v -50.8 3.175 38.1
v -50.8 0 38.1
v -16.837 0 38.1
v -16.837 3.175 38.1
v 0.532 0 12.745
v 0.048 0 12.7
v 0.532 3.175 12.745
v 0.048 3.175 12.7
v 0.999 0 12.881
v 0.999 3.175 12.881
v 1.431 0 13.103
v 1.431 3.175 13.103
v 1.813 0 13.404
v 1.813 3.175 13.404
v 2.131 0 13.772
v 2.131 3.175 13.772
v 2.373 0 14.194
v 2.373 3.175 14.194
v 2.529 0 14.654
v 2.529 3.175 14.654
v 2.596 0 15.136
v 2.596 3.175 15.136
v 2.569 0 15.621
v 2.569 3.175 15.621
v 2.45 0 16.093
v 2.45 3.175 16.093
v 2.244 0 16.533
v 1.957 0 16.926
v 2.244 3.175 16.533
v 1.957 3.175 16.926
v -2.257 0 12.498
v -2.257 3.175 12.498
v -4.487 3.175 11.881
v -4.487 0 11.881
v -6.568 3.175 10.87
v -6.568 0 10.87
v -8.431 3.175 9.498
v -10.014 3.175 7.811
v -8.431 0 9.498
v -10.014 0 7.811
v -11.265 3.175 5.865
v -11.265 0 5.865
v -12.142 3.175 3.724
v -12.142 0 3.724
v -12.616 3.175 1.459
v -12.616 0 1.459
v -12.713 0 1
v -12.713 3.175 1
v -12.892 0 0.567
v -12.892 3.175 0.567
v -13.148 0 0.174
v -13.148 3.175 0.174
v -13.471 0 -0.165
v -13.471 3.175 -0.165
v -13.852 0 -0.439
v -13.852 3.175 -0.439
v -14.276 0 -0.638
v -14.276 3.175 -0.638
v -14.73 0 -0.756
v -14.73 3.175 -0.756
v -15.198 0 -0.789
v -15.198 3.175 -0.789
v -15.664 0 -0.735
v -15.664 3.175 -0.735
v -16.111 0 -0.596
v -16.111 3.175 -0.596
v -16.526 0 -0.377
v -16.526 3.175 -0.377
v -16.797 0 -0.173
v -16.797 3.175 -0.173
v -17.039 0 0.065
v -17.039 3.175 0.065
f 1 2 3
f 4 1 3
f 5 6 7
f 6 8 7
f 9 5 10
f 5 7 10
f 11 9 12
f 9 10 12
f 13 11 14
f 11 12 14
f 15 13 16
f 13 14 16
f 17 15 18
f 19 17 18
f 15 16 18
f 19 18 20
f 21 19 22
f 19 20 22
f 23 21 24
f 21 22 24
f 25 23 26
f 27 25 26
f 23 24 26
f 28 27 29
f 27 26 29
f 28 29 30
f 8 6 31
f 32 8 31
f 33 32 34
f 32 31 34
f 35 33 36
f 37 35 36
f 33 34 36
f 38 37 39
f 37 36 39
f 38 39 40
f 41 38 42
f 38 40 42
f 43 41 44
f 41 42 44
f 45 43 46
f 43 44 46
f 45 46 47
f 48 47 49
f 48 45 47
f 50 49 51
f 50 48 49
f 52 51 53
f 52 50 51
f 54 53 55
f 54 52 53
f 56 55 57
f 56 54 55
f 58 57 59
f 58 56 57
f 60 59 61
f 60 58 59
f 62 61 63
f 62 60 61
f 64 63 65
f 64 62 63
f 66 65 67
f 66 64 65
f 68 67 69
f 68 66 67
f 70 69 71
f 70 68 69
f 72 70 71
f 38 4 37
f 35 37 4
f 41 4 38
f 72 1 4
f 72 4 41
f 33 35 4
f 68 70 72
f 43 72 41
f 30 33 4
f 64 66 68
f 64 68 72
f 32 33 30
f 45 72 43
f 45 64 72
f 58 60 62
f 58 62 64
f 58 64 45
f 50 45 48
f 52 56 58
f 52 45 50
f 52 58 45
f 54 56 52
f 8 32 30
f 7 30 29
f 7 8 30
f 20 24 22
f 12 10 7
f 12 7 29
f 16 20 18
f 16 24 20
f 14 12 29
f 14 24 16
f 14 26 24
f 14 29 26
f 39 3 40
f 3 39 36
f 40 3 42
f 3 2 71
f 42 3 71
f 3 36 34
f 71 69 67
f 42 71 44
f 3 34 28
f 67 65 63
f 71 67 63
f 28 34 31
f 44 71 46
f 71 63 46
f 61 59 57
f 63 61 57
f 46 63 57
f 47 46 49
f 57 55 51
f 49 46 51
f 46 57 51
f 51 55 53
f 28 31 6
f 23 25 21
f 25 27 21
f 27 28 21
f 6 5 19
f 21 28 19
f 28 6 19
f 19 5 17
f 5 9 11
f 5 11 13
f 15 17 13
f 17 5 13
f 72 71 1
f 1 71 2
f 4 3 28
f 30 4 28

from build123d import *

# Parameters (mm, degrees)
BOSS_EXTRUDE1_DEPTH = 3.175
SKETCH2_R           = 12.7
CUT_EXTRUDE1_DEPTH  = 64.579325453
FILLET1_R           = 2.54


with BuildPart() as part:
    # Sketch1 → Boss-Extrude1 (new body)
    with BuildSketch(Plane(origin=(0, 0, 0), x_dir=(1, 0, 0), z_dir=(0, 1, 0))):
        with BuildLine():
            Line((-9.498044736, 8.430726315), (-50.8, -38.1))
            Line((-50.8, -38.1), (-16.8372204, -38.1))
            Line((-16.8372204, -38.1), (9.498044736, -8.430726315))
            ThreePointArc((9.498044736, -8.430726315), (8.430726315, 9.498044736), (-9.498044736, 8.430726315))
        make_face()
    extrude(amount=BOSS_EXTRUDE1_DEPTH)

    # Sketch2 → Cut-Extrude1 (cut, through all)
    with BuildSketch(Plane.XZ):
        Circle(SKETCH2_R)
    extrude(amount=-CUT_EXTRUDE1_DEPTH, mode=Mode.SUBTRACT)

    # Fillet1
    fillet1_edges = [part.edges().sort_by_distance(p)[0] for p in [
        (9.498044736, 1.5875, 8.430726315),
    ]]
    fillet(fillet1_edges, radius=FILLET1_R)
    fillet1_2_edges = [part.edges().sort_by_distance(p)[0] for p in [
        (-9.498044736, 1.5875, -8.430726315),
    ]]
    fillet(fillet1_2_edges, radius=FILLET1_R)


solid = part.part
